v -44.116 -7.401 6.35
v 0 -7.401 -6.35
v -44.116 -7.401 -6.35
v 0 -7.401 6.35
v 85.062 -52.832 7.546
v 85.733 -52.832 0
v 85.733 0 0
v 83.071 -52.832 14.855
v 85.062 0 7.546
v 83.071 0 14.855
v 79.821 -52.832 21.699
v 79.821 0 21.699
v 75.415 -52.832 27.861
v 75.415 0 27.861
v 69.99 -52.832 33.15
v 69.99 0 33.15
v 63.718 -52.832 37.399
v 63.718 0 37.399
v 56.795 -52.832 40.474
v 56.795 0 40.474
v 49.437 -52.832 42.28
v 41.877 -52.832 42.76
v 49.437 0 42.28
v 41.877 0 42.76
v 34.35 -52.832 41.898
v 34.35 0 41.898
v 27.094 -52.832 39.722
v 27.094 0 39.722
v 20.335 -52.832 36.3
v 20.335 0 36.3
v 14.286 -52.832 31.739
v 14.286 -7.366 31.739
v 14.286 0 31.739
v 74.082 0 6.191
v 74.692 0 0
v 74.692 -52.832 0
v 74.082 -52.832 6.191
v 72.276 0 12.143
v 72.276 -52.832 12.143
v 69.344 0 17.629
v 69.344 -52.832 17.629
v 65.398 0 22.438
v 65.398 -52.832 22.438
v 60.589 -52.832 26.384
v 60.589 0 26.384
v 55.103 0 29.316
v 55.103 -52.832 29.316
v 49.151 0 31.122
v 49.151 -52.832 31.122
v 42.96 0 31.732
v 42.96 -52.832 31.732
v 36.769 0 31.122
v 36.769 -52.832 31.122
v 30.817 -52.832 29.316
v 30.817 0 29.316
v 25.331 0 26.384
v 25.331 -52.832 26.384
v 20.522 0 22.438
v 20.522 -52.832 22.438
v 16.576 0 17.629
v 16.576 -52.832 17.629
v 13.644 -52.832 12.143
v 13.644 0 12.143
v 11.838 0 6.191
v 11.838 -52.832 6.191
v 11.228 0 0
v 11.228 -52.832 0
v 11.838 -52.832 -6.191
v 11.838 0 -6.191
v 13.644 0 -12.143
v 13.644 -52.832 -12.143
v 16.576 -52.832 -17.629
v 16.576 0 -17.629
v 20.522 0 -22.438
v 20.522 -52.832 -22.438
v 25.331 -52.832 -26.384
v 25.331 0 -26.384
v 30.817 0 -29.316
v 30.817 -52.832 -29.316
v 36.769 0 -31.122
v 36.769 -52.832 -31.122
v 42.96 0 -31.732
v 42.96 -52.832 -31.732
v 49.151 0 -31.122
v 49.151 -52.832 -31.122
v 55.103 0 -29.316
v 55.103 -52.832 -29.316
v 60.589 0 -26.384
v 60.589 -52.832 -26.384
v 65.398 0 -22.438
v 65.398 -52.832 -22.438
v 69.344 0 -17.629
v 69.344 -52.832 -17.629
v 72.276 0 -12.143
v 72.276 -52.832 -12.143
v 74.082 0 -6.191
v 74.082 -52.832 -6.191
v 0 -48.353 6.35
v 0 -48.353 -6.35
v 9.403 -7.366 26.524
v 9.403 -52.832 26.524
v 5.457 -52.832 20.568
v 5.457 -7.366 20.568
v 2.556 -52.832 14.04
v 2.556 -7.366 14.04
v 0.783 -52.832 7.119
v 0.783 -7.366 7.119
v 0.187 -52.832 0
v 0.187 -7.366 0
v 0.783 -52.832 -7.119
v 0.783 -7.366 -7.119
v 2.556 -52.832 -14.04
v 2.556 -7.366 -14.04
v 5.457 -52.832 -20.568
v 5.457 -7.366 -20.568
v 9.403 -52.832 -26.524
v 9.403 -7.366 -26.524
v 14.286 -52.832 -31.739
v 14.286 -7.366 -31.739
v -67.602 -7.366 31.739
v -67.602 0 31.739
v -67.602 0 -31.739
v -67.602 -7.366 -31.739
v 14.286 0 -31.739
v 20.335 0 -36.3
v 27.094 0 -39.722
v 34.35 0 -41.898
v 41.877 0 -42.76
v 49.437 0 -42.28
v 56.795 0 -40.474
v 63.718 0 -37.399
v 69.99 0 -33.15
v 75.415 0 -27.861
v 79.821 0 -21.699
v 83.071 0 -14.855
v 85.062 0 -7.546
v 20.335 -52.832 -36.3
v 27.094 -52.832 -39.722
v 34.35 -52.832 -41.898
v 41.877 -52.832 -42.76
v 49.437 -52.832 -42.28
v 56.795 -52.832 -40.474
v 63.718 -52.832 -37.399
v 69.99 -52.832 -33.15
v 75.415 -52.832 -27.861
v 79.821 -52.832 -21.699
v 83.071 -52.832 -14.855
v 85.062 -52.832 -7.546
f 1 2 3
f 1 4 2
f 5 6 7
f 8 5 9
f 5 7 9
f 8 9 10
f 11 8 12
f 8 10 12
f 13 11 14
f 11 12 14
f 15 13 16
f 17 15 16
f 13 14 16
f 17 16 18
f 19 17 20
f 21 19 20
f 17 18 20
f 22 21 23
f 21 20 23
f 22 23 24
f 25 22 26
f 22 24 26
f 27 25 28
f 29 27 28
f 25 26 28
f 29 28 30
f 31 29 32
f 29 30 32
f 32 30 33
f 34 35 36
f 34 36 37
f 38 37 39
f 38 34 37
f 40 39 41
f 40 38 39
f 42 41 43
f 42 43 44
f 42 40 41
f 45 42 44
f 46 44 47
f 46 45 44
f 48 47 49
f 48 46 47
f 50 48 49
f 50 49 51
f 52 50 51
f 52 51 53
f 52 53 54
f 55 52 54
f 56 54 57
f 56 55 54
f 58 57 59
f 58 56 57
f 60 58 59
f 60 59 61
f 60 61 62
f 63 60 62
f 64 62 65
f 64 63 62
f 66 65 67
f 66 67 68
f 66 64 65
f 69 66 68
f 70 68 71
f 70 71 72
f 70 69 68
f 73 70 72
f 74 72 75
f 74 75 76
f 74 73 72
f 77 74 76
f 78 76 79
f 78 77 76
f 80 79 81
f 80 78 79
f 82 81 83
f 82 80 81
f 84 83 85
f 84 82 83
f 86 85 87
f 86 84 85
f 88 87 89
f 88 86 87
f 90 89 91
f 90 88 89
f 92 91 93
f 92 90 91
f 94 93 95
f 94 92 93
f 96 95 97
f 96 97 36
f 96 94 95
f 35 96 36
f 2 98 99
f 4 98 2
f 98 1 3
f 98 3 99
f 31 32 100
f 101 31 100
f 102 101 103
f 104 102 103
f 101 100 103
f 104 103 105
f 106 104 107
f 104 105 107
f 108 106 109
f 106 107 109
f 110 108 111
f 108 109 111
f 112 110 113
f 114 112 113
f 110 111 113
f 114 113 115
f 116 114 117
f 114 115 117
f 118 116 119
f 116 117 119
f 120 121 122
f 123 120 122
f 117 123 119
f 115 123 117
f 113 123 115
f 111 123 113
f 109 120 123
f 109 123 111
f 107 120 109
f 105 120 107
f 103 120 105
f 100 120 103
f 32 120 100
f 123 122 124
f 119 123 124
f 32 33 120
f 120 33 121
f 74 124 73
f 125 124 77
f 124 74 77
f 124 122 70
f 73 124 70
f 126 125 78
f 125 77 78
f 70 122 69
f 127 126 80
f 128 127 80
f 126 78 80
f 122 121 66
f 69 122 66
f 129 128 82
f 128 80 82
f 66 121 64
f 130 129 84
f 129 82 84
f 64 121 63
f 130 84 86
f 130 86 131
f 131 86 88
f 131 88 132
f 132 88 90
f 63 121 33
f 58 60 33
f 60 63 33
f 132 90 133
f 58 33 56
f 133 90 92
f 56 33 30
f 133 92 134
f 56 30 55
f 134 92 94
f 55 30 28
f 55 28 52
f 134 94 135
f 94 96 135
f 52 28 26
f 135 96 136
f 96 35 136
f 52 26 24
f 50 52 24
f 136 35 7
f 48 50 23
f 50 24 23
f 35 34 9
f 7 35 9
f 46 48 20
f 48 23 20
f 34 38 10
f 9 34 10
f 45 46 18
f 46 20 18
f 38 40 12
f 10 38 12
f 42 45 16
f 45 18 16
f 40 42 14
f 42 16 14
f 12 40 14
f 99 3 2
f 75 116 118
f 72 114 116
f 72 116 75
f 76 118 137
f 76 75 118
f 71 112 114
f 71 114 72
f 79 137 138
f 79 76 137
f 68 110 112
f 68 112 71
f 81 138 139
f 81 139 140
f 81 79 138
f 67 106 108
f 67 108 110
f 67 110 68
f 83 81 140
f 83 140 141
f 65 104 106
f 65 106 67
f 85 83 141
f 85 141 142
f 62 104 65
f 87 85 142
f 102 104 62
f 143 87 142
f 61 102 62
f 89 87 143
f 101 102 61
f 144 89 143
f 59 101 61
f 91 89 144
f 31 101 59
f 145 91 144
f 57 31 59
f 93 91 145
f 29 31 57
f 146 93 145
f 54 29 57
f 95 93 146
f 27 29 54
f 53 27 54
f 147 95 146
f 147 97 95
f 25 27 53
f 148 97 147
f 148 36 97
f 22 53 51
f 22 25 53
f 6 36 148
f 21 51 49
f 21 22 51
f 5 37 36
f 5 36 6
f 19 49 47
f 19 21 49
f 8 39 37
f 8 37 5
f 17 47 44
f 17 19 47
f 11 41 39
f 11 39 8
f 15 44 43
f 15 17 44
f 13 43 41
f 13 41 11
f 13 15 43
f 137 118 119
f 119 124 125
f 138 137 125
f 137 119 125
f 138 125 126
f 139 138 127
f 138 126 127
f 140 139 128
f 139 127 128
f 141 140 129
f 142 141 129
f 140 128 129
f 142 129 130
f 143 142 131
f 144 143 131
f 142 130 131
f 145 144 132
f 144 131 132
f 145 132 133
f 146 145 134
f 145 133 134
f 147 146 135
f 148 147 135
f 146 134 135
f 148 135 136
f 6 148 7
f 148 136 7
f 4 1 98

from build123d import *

# Parameters (mm, degrees)
F0_R     = 31.731812
F1_DEPTH = 52.832
F2_DEPTH = 7.366
F4_DEPTH = 6.35


with BuildPart() as f1:
    # F0 (on Front) → F1 (new body)
    with BuildSketch(Plane.XZ):
        with BuildLine():
            ThreePointArc((14.285808, 31.738713), (0.18668, 0), (14.285808, -31.738713))
            ThreePointArc((14.285808, -31.738713), (60.324641, -39.089882), (85.733199, 0))
            ThreePointArc((85.733199, 0), (60.324641, 39.089882), (14.285808, 31.738713))
        make_face()
        with Locations((42.95994, 0)):
            Circle(F0_R, mode=Mode.SUBTRACT)
    extrude(amount=F1_DEPTH)

    # F0 (on Front) → F2 (join)
    with BuildSketch(Plane.XZ):
        with BuildLine():
            Line((-67.602344, -31.738713), (14.285808, -31.738713))
            ThreePointArc((14.285808, -31.738713), (0.18668, 0), (14.285808, 31.738713))
            Line((14.285808, 31.738713), (-67.602344, 31.738713))
            Line((-67.602344, 31.738713), (-67.602344, -31.738713))
        make_face()
    extrude(amount=F2_DEPTH)


with BuildPart() as f4:
    # F3 (on Top) → F4 (new body, symmetric)
    with BuildSketch(Plane.XY):
        Polygon((0, -7.401346), (-44.116303, -7.401346), (0, -48.352592), align=None)
    extrude(amount=F4_DEPTH, both=True)


solid = Compound([f1.part, f4.part])
